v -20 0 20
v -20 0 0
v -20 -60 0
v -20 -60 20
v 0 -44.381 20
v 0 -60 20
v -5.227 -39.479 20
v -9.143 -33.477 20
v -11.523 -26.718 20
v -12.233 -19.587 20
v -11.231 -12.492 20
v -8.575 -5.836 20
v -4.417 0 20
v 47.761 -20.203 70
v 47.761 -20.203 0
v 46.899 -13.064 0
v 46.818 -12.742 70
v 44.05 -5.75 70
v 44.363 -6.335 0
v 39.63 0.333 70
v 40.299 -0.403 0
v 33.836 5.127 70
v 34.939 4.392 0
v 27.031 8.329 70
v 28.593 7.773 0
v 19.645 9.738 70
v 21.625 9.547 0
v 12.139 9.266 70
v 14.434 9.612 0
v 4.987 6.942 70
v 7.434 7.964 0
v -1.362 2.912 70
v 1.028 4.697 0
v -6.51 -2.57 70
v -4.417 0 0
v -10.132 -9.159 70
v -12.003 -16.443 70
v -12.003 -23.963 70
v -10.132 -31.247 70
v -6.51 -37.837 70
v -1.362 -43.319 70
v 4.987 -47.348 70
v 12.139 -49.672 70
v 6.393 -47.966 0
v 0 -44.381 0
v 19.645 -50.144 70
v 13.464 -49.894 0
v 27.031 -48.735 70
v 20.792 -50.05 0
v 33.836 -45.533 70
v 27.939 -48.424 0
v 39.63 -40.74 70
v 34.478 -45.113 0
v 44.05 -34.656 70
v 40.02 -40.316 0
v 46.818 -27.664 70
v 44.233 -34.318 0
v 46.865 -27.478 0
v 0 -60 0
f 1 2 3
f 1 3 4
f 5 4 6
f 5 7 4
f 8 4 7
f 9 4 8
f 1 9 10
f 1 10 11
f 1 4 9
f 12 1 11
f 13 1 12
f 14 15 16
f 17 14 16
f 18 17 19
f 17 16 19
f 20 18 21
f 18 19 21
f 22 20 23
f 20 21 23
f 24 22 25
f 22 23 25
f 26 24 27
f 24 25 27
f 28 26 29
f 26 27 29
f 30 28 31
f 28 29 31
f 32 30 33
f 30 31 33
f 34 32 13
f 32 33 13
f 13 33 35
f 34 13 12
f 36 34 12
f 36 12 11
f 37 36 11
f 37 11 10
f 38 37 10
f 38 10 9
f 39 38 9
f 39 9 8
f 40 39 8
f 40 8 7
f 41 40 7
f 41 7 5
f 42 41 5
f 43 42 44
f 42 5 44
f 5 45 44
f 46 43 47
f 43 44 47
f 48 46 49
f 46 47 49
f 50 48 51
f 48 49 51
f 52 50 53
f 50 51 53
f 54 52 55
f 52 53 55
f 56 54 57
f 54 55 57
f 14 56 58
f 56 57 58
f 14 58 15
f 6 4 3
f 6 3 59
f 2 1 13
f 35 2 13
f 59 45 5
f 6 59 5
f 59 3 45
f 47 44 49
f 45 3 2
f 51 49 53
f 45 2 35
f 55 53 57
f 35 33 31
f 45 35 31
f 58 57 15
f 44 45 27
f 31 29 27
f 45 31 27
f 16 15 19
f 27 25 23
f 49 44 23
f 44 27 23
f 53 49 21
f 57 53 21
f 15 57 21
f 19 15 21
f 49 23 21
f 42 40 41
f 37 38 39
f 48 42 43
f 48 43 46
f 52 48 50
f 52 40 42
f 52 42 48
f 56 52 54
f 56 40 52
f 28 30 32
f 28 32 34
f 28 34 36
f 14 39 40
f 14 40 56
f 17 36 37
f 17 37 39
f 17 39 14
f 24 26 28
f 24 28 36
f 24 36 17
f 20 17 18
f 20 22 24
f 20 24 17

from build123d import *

# Parameters (mm, degrees)
F0_R     = 30
F1_DEPTH = 70
F2_W     = 20
F2_H     = 20
F3_DEPTH = 60


with BuildPart() as f1:
    # F0 (on Top) → F1 (new body)
    with BuildSketch(Plane.XY):
        with Locations((17.760798, -20.20311)):
            Circle(F0_R)
    extrude(amount=F1_DEPTH)

    # F2 (on Front) → F3 (join)
    with BuildSketch(Plane.XZ):
        with Locations((-10, 10)):
            Rectangle(F2_W, F2_H)
    extrude(amount=F3_DEPTH)


solid = f1.part
